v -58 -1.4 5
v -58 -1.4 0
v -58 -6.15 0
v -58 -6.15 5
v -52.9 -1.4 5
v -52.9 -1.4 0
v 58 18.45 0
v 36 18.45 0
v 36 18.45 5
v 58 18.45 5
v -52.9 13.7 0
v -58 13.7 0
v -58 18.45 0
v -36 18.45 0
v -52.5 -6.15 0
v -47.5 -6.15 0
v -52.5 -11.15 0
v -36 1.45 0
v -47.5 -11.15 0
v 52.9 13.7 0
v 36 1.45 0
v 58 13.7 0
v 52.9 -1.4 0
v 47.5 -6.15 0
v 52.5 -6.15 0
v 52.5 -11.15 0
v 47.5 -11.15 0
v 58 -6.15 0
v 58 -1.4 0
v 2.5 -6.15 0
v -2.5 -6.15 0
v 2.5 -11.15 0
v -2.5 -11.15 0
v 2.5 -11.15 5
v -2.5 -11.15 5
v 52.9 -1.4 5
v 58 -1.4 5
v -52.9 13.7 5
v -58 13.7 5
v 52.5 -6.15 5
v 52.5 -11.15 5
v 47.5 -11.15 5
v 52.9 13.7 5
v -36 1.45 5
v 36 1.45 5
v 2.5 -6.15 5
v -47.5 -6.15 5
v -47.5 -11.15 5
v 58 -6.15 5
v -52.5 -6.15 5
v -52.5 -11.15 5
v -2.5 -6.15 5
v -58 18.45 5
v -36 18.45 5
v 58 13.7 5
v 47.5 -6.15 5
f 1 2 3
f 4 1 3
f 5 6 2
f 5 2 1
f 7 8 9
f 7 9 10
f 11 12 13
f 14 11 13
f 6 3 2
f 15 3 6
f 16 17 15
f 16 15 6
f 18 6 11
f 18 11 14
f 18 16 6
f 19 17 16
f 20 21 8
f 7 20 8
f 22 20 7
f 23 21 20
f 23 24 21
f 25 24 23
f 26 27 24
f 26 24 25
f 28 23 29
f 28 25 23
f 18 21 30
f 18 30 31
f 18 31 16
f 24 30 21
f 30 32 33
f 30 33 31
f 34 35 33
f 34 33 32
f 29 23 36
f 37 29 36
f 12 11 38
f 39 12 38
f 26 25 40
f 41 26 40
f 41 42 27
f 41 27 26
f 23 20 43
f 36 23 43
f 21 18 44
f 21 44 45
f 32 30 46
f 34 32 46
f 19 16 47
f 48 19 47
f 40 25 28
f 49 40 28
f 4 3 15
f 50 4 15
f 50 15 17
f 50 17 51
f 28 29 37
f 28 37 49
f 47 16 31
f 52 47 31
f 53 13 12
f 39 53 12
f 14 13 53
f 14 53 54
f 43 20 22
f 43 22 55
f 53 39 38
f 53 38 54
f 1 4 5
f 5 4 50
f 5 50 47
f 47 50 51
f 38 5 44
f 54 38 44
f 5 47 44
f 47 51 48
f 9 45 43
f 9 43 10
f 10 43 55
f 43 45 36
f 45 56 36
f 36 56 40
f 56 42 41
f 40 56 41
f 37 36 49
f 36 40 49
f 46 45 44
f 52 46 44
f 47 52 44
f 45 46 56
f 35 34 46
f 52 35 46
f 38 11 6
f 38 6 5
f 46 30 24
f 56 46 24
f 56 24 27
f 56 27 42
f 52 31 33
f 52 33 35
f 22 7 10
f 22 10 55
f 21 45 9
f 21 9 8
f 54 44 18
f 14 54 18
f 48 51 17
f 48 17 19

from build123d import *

# Parameters (mm, degrees)
SKETCH1_W           = 116
SKETCH1_H           = 12.3
BOSS_EXTRUDE1_DEPTH = 5
SKETCH2_W           = 5
SKETCH2_H           = 5
BOSS_EXTRUDE2_DEPTH = 5
SKETCH3_W           = 72
SKETCH3_H           = 5
CUT_EXTRUDE1_DEPTH  = 17
SKETCH4_W           = 5
SKETCH4_H           = 5
BOSS_EXTRUDE3_DEPTH = 5
SKETCH5_W           = 5
SKETCH5_H           = 15.1
CUT_EXTRUDE2_DEPTH  = 5.1


with BuildPart() as part:
    # Sketch1 → Boss-Extrude1 (new body)
    with BuildSketch(Plane.XY):
        Rectangle(SKETCH1_W, SKETCH1_H)
    extrude(amount=BOSS_EXTRUDE1_DEPTH)

    # Mirror1: part across plane


with BuildPart() as part_1:
    add(part.part)
    add(part.part.mirror(Plane(origin=(-58, 6.15, 5), x_dir=(0, 0, 1), z_dir=(0, -1, 0))))

    # Sketch2 → Boss-Extrude2 (add)
    with BuildSketch(Plane.XZ.offset(6.15)):
        with Locations((-50, 2.5)):
            Rectangle(SKETCH2_W, SKETCH2_H)
        with Locations((50, 2.5)):
            Rectangle(SKETCH2_W, SKETCH2_H)
    extrude(amount=BOSS_EXTRUDE2_DEPTH)

    # Sketch3 → Cut-Extrude1 (cut)
    with BuildSketch(Plane(origin=(0, 18.45, 0), x_dir=(1, 0, 0), z_dir=(0, 1, 0))):
        with Locations((0, -2.5)):
            Rectangle(SKETCH3_W, SKETCH3_H)
    extrude(amount=-CUT_EXTRUDE1_DEPTH, mode=Mode.SUBTRACT)

    # Sketch4 → Boss-Extrude3 (add)
    with BuildSketch(Plane.XZ.offset(6.15)):
        with Locations((0, 2.5)):
            Rectangle(SKETCH4_W, SKETCH4_H)
    extrude(amount=BOSS_EXTRUDE3_DEPTH)

    # Sketch5 → Cut-Extrude2 (cut)
    with BuildSketch(Plane.ZY.offset(58)):
        with Locations((2.5, 6.15)):
            Rectangle(SKETCH5_W, SKETCH5_H)
    cut_extrude2 = extrude(amount=-CUT_EXTRUDE2_DEPTH, mode=Mode.SUBTRACT)

    # Mirror2: Cut-Extrude2 across plane
    add(cut_extrude2.mirror(Plane(origin=(0, 0, 0), x_dir=(0, 0, 1), z_dir=(1, 0, 0))), mode=Mode.SUBTRACT)


solid = part_1.part
